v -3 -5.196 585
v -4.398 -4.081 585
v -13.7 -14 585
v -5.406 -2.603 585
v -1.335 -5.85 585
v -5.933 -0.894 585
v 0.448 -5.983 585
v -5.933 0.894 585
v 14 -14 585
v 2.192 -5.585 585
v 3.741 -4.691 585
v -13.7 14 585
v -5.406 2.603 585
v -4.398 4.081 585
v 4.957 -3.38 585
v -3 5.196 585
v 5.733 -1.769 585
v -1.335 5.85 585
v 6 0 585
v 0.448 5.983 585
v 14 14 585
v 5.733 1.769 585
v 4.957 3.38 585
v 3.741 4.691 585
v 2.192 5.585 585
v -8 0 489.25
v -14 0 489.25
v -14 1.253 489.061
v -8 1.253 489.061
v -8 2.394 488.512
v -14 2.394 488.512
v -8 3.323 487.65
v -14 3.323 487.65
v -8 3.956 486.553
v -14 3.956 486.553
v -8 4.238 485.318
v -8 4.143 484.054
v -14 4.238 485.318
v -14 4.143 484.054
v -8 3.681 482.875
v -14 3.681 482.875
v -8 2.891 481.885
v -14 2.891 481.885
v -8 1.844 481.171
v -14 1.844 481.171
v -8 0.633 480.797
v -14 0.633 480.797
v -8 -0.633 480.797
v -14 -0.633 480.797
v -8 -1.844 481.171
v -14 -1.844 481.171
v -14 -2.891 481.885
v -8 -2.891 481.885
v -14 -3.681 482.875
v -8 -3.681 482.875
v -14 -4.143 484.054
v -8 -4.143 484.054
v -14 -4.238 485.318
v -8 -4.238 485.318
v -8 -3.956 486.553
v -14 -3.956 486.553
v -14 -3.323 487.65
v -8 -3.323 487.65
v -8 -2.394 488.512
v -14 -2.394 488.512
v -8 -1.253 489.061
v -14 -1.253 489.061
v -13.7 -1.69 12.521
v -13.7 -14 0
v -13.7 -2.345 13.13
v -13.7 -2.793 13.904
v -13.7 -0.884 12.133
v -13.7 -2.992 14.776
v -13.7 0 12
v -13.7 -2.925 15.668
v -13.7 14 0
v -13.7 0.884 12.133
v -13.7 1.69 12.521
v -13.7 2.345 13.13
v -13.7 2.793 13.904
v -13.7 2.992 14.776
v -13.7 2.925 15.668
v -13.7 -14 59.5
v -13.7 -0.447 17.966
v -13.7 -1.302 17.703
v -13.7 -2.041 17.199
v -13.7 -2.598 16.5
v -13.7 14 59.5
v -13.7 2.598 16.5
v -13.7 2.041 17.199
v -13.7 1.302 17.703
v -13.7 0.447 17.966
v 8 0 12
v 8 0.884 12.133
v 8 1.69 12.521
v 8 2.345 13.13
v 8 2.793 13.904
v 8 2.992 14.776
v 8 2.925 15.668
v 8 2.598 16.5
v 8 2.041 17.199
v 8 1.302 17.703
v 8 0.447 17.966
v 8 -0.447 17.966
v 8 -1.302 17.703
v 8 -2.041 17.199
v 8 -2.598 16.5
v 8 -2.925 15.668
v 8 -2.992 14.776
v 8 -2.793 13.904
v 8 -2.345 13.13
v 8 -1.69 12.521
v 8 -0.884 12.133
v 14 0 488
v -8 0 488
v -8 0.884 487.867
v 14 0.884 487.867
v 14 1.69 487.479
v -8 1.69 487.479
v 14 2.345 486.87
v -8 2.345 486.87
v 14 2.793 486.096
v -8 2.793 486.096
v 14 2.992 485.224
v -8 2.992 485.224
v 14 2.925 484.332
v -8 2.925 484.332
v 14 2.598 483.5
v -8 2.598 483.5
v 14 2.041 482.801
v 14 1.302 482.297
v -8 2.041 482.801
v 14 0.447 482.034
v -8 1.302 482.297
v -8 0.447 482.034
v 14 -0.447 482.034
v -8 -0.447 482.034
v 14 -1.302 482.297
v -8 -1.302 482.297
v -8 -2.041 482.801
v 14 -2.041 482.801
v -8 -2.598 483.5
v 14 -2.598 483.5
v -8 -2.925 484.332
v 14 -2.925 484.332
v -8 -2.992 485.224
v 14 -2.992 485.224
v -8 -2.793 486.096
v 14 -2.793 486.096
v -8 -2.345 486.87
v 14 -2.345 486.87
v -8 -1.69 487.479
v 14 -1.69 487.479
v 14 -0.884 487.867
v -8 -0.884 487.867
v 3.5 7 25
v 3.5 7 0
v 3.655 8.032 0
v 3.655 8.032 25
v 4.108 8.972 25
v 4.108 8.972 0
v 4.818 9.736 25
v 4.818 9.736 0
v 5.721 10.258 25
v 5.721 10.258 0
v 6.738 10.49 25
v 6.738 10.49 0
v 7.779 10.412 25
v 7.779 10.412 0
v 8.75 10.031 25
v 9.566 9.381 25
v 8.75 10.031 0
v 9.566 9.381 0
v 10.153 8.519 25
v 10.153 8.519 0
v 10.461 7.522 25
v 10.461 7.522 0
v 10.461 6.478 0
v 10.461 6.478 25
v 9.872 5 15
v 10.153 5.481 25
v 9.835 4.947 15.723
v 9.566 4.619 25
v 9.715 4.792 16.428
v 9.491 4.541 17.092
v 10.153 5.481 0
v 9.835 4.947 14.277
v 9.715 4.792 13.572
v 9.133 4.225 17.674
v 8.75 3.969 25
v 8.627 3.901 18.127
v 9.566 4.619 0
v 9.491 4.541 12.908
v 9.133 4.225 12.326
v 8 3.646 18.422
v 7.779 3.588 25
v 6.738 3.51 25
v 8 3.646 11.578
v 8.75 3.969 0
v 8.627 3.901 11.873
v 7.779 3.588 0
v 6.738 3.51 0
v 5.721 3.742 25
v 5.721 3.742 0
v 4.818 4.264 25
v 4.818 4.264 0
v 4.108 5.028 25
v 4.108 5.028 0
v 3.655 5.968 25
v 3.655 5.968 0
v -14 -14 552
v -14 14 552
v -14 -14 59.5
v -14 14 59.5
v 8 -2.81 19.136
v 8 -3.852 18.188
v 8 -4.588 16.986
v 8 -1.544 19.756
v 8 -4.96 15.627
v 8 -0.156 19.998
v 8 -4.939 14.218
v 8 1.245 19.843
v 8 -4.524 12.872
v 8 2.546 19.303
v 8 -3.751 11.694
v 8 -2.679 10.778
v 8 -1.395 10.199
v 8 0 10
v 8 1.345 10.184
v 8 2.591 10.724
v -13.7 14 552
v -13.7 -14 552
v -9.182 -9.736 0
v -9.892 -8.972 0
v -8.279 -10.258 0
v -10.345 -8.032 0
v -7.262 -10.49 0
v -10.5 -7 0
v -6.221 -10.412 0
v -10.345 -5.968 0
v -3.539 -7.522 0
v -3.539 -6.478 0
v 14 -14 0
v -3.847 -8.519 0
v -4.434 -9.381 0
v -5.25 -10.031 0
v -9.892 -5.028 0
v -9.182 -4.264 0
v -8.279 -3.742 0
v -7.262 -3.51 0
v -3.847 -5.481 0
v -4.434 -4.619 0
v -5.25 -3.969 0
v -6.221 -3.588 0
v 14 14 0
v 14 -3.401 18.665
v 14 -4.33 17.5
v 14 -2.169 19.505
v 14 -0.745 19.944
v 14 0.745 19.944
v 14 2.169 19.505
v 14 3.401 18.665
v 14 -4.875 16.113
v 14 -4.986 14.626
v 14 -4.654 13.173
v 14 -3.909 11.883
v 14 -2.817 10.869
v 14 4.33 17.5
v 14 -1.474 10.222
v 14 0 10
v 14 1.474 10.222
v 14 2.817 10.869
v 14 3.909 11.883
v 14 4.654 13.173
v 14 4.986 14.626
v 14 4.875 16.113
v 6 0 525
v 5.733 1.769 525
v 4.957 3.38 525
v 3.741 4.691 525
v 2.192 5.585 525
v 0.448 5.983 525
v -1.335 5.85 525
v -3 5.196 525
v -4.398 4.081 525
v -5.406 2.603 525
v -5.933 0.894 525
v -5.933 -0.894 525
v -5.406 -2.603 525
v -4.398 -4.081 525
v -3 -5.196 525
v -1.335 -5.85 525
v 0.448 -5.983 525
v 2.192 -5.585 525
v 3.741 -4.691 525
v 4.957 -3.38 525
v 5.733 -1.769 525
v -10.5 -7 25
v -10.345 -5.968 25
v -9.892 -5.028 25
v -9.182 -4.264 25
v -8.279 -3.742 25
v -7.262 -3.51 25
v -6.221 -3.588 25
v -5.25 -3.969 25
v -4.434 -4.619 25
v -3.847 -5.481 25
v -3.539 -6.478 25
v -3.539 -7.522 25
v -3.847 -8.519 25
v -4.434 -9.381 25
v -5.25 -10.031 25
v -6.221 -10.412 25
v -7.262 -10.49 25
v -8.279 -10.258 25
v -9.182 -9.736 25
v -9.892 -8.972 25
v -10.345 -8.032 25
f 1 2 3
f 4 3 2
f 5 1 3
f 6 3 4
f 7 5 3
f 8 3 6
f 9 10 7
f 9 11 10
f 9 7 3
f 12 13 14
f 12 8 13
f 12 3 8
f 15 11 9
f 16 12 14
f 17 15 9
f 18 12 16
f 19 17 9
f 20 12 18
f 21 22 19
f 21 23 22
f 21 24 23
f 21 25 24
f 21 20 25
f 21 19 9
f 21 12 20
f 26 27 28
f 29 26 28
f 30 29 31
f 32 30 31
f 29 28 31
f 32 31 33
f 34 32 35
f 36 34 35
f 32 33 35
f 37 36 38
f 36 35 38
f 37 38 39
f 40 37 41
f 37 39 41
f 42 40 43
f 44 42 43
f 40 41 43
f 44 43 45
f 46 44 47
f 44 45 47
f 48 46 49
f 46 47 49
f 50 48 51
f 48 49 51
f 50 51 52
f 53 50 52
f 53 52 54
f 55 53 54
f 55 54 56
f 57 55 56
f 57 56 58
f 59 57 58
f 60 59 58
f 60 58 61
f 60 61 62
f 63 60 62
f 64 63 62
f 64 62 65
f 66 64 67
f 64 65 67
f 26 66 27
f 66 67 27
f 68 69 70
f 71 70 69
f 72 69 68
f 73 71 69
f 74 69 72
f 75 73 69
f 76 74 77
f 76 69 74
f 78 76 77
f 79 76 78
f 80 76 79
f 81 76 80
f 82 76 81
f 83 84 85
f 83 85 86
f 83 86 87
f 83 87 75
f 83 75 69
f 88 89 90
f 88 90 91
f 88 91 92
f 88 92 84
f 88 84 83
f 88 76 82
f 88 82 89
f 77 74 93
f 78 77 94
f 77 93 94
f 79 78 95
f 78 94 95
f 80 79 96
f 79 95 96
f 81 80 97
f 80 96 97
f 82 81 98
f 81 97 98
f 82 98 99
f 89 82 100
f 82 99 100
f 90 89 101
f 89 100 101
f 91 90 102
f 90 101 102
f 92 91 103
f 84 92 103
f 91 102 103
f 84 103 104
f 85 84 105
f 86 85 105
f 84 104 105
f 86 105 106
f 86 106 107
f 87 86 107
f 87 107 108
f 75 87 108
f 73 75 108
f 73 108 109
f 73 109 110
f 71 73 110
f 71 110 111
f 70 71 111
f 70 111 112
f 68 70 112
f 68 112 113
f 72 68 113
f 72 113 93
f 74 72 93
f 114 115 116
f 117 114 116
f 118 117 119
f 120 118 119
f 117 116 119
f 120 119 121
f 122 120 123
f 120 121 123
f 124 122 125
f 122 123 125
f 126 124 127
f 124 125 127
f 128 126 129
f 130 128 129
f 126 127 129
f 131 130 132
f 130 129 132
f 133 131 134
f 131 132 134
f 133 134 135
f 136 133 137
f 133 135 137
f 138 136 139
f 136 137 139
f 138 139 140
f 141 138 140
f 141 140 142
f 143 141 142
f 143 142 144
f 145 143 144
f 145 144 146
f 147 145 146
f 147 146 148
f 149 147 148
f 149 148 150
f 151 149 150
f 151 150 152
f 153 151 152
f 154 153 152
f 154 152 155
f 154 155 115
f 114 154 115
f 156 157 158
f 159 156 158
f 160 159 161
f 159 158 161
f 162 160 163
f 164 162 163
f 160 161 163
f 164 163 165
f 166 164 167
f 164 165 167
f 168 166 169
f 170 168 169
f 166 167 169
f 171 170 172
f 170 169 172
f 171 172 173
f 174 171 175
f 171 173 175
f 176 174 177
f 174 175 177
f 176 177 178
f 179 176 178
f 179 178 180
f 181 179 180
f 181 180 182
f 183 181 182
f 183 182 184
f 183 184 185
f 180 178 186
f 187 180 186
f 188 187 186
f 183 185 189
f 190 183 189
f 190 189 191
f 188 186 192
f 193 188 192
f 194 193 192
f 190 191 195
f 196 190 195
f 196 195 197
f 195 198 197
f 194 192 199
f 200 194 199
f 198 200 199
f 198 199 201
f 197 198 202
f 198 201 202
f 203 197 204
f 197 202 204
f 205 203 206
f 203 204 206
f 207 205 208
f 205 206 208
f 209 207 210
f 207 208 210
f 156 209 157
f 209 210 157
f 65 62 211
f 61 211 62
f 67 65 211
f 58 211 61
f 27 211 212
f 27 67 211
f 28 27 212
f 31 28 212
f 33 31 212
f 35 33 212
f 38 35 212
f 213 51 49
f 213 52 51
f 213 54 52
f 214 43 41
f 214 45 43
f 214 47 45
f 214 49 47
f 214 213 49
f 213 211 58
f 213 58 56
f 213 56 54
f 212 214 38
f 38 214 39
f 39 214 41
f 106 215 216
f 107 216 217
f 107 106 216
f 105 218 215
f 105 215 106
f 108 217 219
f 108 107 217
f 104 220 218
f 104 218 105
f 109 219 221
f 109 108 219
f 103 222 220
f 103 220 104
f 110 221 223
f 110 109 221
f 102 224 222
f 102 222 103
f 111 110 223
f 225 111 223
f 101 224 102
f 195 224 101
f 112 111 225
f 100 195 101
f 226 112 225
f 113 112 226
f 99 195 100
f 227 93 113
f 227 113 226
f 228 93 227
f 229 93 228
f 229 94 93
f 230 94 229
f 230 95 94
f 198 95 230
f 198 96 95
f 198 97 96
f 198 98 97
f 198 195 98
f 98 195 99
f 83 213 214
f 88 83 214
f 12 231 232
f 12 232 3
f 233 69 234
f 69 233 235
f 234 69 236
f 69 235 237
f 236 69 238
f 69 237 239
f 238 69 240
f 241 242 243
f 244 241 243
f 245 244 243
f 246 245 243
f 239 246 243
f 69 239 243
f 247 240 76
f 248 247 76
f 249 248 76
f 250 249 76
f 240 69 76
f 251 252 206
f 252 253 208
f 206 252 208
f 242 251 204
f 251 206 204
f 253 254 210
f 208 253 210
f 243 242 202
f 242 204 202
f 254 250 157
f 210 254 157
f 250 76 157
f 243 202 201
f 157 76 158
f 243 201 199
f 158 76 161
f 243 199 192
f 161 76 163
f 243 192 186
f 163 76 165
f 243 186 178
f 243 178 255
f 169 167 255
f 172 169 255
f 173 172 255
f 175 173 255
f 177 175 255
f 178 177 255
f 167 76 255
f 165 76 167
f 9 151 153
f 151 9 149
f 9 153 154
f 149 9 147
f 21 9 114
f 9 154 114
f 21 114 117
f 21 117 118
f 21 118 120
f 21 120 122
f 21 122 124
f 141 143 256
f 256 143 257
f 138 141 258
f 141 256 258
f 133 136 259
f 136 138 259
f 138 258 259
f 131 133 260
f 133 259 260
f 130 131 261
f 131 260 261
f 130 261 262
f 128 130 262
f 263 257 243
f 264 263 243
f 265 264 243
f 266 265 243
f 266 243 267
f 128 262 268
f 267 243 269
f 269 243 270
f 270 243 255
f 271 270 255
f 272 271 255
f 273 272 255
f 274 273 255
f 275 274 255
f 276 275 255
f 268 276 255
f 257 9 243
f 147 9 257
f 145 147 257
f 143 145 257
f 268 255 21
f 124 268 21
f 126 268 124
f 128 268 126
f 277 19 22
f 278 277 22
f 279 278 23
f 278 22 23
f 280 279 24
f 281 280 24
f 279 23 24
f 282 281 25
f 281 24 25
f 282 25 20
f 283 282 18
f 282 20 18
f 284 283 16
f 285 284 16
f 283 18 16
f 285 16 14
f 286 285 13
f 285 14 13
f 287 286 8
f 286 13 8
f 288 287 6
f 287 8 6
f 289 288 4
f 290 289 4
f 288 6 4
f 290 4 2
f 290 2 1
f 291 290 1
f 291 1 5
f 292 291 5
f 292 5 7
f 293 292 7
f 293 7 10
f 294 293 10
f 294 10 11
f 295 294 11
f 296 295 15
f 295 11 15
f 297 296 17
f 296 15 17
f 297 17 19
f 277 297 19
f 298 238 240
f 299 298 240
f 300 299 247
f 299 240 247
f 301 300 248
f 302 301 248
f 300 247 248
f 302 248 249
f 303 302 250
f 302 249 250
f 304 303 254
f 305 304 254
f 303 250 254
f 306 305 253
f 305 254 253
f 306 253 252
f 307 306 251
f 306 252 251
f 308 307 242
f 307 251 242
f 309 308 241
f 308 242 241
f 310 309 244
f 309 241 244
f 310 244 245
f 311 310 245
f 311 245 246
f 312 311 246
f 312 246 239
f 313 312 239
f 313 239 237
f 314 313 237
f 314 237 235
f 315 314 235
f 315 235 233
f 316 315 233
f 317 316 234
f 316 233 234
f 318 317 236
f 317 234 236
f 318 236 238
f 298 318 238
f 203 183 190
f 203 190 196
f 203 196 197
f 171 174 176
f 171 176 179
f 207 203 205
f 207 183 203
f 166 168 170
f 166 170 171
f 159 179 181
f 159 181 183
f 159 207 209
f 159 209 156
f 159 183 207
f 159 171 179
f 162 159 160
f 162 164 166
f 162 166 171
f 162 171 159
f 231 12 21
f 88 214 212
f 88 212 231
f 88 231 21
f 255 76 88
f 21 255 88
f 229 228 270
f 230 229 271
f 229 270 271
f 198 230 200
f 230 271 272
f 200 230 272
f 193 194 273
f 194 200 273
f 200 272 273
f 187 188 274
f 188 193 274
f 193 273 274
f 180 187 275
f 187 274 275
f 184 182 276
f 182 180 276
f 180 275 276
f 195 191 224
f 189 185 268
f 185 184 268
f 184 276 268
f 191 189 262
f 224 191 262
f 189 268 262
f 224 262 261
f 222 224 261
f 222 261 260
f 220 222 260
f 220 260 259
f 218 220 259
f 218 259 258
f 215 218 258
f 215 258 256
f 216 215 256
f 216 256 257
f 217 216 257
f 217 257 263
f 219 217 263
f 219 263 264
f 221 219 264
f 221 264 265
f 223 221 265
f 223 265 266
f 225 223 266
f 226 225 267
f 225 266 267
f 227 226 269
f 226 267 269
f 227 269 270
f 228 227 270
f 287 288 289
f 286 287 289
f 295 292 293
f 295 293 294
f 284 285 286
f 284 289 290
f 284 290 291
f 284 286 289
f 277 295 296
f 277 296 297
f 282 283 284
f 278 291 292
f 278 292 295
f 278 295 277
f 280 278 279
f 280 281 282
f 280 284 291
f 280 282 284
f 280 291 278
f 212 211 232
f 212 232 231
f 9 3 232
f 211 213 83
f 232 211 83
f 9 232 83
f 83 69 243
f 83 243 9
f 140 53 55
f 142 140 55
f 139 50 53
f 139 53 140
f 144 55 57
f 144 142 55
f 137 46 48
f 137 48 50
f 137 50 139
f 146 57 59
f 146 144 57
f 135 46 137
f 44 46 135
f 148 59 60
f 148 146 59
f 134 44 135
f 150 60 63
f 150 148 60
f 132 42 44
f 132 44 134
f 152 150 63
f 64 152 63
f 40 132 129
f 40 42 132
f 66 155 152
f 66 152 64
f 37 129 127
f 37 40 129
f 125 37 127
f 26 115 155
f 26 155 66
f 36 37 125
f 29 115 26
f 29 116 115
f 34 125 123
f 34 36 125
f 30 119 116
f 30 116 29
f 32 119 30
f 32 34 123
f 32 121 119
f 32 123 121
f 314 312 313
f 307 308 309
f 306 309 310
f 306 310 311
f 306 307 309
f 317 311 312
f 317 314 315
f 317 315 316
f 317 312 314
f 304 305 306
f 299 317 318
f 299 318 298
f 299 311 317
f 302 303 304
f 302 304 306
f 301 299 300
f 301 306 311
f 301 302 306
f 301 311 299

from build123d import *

# Parameters (mm, degrees)
IZIM1_W                     = 28
IZIM1_H                     = 28
Y_KSEKLIK_EKSTR_ZYON1_DEPTH = 585
IZIM2_R                     = 6
KES_EKSTR_ZYON1_DEPTH       = 60
SKETCH1_R                   = 3.5
CUT_EXTRUDE1_DEPTH          = 25
SKETCH3_R                   = 3
CUT_EXTRUDE2_DEPTH          = 586.837008049
SKETCH5_R                   = 4.25
CUT_EXTRUDE4_DEPTH          = 6
SKETCH6_W                   = 68.791406121
SKETCH6_H                   = 219.206637727
SKETCH6_W_2                 = 68.987868966
SKETCH6_H_2                 = 174.940464565
CUT_EXTRUDE5_DEPTH          = 0.3
SKETCH7_R                   = 3
CUT_EXTRUDE6_DEPTH          = 84
SKETCH8_R                   = 5
CUT_EXTRUDE7_DEPTH          = 6


with BuildPart() as part:
    # Çizim1 → Yükseklik-Ekstrüzyon1 (new body)
    with BuildSketch(Plane.XY):
        Rectangle(IZIM1_W, IZIM1_H)
    extrude(amount=Y_KSEKLIK_EKSTR_ZYON1_DEPTH)

    # Çizim2 → Kes-Ekstrüzyon1 (cut)
    with BuildSketch(Plane.XY.offset(585)):
        Circle(IZIM2_R)
    extrude(amount=-KES_EKSTR_ZYON1_DEPTH, mode=Mode.SUBTRACT)

    # Sketch1 → Cut-Extrude1 (cut)
    with BuildSketch(Plane(origin=(0, 0, 0), x_dir=(-1, 0, 0), z_dir=(0, 0, -1))):
        with Locations((-7, 7)):
            Circle(SKETCH1_R)
        with Locations((7, -7)):
            Circle(SKETCH1_R)
    extrude(amount=-CUT_EXTRUDE1_DEPTH, mode=Mode.SUBTRACT)

    # Sketch3 → Cut-Extrude2 (cut, through all)
    with BuildSketch(Plane.ZY.offset(14)):
        with Locations((485, 0)):
            Circle(SKETCH3_R)
    extrude(amount=-CUT_EXTRUDE2_DEPTH, mode=Mode.SUBTRACT)

    # Sketch5 → Cut-Extrude4 (cut)
    with BuildSketch(Plane.ZY.offset(14)):
        with Locations((485, 0)):
            Circle(SKETCH5_R)
    extrude(amount=-CUT_EXTRUDE4_DEPTH, mode=Mode.SUBTRACT)

    # Sketch6 → Cut-Extrude5 (cut)
    with BuildSketch(Plane.ZY.offset(14)):
        with Locations((586.39570306, 18.878857334)):
            Rectangle(SKETCH6_W, SKETCH6_H)
        with Locations((25.006065517, 7.665656751)):
            Rectangle(SKETCH6_W_2, SKETCH6_H_2)
    extrude(amount=-CUT_EXTRUDE5_DEPTH, mode=Mode.SUBTRACT)

    # Sketch7 → Cut-Extrude6 (cut)
    with BuildSketch(Plane(origin=(14, 0, 0), x_dir=(0, 0, -1), z_dir=(1, 0, 0))):
        with Locations((-15, 0)):
            Circle(SKETCH7_R)
    extrude(amount=-CUT_EXTRUDE6_DEPTH, mode=Mode.SUBTRACT)

    # Sketch8 → Cut-Extrude7 (cut)
    with BuildSketch(Plane(origin=(14, 0, 0), x_dir=(0, 0, -1), z_dir=(1, 0, 0))):
        with Locations((-15, 0)):
            Circle(SKETCH8_R)
    extrude(amount=-CUT_EXTRUDE7_DEPTH, mode=Mode.SUBTRACT)


solid = part.part
